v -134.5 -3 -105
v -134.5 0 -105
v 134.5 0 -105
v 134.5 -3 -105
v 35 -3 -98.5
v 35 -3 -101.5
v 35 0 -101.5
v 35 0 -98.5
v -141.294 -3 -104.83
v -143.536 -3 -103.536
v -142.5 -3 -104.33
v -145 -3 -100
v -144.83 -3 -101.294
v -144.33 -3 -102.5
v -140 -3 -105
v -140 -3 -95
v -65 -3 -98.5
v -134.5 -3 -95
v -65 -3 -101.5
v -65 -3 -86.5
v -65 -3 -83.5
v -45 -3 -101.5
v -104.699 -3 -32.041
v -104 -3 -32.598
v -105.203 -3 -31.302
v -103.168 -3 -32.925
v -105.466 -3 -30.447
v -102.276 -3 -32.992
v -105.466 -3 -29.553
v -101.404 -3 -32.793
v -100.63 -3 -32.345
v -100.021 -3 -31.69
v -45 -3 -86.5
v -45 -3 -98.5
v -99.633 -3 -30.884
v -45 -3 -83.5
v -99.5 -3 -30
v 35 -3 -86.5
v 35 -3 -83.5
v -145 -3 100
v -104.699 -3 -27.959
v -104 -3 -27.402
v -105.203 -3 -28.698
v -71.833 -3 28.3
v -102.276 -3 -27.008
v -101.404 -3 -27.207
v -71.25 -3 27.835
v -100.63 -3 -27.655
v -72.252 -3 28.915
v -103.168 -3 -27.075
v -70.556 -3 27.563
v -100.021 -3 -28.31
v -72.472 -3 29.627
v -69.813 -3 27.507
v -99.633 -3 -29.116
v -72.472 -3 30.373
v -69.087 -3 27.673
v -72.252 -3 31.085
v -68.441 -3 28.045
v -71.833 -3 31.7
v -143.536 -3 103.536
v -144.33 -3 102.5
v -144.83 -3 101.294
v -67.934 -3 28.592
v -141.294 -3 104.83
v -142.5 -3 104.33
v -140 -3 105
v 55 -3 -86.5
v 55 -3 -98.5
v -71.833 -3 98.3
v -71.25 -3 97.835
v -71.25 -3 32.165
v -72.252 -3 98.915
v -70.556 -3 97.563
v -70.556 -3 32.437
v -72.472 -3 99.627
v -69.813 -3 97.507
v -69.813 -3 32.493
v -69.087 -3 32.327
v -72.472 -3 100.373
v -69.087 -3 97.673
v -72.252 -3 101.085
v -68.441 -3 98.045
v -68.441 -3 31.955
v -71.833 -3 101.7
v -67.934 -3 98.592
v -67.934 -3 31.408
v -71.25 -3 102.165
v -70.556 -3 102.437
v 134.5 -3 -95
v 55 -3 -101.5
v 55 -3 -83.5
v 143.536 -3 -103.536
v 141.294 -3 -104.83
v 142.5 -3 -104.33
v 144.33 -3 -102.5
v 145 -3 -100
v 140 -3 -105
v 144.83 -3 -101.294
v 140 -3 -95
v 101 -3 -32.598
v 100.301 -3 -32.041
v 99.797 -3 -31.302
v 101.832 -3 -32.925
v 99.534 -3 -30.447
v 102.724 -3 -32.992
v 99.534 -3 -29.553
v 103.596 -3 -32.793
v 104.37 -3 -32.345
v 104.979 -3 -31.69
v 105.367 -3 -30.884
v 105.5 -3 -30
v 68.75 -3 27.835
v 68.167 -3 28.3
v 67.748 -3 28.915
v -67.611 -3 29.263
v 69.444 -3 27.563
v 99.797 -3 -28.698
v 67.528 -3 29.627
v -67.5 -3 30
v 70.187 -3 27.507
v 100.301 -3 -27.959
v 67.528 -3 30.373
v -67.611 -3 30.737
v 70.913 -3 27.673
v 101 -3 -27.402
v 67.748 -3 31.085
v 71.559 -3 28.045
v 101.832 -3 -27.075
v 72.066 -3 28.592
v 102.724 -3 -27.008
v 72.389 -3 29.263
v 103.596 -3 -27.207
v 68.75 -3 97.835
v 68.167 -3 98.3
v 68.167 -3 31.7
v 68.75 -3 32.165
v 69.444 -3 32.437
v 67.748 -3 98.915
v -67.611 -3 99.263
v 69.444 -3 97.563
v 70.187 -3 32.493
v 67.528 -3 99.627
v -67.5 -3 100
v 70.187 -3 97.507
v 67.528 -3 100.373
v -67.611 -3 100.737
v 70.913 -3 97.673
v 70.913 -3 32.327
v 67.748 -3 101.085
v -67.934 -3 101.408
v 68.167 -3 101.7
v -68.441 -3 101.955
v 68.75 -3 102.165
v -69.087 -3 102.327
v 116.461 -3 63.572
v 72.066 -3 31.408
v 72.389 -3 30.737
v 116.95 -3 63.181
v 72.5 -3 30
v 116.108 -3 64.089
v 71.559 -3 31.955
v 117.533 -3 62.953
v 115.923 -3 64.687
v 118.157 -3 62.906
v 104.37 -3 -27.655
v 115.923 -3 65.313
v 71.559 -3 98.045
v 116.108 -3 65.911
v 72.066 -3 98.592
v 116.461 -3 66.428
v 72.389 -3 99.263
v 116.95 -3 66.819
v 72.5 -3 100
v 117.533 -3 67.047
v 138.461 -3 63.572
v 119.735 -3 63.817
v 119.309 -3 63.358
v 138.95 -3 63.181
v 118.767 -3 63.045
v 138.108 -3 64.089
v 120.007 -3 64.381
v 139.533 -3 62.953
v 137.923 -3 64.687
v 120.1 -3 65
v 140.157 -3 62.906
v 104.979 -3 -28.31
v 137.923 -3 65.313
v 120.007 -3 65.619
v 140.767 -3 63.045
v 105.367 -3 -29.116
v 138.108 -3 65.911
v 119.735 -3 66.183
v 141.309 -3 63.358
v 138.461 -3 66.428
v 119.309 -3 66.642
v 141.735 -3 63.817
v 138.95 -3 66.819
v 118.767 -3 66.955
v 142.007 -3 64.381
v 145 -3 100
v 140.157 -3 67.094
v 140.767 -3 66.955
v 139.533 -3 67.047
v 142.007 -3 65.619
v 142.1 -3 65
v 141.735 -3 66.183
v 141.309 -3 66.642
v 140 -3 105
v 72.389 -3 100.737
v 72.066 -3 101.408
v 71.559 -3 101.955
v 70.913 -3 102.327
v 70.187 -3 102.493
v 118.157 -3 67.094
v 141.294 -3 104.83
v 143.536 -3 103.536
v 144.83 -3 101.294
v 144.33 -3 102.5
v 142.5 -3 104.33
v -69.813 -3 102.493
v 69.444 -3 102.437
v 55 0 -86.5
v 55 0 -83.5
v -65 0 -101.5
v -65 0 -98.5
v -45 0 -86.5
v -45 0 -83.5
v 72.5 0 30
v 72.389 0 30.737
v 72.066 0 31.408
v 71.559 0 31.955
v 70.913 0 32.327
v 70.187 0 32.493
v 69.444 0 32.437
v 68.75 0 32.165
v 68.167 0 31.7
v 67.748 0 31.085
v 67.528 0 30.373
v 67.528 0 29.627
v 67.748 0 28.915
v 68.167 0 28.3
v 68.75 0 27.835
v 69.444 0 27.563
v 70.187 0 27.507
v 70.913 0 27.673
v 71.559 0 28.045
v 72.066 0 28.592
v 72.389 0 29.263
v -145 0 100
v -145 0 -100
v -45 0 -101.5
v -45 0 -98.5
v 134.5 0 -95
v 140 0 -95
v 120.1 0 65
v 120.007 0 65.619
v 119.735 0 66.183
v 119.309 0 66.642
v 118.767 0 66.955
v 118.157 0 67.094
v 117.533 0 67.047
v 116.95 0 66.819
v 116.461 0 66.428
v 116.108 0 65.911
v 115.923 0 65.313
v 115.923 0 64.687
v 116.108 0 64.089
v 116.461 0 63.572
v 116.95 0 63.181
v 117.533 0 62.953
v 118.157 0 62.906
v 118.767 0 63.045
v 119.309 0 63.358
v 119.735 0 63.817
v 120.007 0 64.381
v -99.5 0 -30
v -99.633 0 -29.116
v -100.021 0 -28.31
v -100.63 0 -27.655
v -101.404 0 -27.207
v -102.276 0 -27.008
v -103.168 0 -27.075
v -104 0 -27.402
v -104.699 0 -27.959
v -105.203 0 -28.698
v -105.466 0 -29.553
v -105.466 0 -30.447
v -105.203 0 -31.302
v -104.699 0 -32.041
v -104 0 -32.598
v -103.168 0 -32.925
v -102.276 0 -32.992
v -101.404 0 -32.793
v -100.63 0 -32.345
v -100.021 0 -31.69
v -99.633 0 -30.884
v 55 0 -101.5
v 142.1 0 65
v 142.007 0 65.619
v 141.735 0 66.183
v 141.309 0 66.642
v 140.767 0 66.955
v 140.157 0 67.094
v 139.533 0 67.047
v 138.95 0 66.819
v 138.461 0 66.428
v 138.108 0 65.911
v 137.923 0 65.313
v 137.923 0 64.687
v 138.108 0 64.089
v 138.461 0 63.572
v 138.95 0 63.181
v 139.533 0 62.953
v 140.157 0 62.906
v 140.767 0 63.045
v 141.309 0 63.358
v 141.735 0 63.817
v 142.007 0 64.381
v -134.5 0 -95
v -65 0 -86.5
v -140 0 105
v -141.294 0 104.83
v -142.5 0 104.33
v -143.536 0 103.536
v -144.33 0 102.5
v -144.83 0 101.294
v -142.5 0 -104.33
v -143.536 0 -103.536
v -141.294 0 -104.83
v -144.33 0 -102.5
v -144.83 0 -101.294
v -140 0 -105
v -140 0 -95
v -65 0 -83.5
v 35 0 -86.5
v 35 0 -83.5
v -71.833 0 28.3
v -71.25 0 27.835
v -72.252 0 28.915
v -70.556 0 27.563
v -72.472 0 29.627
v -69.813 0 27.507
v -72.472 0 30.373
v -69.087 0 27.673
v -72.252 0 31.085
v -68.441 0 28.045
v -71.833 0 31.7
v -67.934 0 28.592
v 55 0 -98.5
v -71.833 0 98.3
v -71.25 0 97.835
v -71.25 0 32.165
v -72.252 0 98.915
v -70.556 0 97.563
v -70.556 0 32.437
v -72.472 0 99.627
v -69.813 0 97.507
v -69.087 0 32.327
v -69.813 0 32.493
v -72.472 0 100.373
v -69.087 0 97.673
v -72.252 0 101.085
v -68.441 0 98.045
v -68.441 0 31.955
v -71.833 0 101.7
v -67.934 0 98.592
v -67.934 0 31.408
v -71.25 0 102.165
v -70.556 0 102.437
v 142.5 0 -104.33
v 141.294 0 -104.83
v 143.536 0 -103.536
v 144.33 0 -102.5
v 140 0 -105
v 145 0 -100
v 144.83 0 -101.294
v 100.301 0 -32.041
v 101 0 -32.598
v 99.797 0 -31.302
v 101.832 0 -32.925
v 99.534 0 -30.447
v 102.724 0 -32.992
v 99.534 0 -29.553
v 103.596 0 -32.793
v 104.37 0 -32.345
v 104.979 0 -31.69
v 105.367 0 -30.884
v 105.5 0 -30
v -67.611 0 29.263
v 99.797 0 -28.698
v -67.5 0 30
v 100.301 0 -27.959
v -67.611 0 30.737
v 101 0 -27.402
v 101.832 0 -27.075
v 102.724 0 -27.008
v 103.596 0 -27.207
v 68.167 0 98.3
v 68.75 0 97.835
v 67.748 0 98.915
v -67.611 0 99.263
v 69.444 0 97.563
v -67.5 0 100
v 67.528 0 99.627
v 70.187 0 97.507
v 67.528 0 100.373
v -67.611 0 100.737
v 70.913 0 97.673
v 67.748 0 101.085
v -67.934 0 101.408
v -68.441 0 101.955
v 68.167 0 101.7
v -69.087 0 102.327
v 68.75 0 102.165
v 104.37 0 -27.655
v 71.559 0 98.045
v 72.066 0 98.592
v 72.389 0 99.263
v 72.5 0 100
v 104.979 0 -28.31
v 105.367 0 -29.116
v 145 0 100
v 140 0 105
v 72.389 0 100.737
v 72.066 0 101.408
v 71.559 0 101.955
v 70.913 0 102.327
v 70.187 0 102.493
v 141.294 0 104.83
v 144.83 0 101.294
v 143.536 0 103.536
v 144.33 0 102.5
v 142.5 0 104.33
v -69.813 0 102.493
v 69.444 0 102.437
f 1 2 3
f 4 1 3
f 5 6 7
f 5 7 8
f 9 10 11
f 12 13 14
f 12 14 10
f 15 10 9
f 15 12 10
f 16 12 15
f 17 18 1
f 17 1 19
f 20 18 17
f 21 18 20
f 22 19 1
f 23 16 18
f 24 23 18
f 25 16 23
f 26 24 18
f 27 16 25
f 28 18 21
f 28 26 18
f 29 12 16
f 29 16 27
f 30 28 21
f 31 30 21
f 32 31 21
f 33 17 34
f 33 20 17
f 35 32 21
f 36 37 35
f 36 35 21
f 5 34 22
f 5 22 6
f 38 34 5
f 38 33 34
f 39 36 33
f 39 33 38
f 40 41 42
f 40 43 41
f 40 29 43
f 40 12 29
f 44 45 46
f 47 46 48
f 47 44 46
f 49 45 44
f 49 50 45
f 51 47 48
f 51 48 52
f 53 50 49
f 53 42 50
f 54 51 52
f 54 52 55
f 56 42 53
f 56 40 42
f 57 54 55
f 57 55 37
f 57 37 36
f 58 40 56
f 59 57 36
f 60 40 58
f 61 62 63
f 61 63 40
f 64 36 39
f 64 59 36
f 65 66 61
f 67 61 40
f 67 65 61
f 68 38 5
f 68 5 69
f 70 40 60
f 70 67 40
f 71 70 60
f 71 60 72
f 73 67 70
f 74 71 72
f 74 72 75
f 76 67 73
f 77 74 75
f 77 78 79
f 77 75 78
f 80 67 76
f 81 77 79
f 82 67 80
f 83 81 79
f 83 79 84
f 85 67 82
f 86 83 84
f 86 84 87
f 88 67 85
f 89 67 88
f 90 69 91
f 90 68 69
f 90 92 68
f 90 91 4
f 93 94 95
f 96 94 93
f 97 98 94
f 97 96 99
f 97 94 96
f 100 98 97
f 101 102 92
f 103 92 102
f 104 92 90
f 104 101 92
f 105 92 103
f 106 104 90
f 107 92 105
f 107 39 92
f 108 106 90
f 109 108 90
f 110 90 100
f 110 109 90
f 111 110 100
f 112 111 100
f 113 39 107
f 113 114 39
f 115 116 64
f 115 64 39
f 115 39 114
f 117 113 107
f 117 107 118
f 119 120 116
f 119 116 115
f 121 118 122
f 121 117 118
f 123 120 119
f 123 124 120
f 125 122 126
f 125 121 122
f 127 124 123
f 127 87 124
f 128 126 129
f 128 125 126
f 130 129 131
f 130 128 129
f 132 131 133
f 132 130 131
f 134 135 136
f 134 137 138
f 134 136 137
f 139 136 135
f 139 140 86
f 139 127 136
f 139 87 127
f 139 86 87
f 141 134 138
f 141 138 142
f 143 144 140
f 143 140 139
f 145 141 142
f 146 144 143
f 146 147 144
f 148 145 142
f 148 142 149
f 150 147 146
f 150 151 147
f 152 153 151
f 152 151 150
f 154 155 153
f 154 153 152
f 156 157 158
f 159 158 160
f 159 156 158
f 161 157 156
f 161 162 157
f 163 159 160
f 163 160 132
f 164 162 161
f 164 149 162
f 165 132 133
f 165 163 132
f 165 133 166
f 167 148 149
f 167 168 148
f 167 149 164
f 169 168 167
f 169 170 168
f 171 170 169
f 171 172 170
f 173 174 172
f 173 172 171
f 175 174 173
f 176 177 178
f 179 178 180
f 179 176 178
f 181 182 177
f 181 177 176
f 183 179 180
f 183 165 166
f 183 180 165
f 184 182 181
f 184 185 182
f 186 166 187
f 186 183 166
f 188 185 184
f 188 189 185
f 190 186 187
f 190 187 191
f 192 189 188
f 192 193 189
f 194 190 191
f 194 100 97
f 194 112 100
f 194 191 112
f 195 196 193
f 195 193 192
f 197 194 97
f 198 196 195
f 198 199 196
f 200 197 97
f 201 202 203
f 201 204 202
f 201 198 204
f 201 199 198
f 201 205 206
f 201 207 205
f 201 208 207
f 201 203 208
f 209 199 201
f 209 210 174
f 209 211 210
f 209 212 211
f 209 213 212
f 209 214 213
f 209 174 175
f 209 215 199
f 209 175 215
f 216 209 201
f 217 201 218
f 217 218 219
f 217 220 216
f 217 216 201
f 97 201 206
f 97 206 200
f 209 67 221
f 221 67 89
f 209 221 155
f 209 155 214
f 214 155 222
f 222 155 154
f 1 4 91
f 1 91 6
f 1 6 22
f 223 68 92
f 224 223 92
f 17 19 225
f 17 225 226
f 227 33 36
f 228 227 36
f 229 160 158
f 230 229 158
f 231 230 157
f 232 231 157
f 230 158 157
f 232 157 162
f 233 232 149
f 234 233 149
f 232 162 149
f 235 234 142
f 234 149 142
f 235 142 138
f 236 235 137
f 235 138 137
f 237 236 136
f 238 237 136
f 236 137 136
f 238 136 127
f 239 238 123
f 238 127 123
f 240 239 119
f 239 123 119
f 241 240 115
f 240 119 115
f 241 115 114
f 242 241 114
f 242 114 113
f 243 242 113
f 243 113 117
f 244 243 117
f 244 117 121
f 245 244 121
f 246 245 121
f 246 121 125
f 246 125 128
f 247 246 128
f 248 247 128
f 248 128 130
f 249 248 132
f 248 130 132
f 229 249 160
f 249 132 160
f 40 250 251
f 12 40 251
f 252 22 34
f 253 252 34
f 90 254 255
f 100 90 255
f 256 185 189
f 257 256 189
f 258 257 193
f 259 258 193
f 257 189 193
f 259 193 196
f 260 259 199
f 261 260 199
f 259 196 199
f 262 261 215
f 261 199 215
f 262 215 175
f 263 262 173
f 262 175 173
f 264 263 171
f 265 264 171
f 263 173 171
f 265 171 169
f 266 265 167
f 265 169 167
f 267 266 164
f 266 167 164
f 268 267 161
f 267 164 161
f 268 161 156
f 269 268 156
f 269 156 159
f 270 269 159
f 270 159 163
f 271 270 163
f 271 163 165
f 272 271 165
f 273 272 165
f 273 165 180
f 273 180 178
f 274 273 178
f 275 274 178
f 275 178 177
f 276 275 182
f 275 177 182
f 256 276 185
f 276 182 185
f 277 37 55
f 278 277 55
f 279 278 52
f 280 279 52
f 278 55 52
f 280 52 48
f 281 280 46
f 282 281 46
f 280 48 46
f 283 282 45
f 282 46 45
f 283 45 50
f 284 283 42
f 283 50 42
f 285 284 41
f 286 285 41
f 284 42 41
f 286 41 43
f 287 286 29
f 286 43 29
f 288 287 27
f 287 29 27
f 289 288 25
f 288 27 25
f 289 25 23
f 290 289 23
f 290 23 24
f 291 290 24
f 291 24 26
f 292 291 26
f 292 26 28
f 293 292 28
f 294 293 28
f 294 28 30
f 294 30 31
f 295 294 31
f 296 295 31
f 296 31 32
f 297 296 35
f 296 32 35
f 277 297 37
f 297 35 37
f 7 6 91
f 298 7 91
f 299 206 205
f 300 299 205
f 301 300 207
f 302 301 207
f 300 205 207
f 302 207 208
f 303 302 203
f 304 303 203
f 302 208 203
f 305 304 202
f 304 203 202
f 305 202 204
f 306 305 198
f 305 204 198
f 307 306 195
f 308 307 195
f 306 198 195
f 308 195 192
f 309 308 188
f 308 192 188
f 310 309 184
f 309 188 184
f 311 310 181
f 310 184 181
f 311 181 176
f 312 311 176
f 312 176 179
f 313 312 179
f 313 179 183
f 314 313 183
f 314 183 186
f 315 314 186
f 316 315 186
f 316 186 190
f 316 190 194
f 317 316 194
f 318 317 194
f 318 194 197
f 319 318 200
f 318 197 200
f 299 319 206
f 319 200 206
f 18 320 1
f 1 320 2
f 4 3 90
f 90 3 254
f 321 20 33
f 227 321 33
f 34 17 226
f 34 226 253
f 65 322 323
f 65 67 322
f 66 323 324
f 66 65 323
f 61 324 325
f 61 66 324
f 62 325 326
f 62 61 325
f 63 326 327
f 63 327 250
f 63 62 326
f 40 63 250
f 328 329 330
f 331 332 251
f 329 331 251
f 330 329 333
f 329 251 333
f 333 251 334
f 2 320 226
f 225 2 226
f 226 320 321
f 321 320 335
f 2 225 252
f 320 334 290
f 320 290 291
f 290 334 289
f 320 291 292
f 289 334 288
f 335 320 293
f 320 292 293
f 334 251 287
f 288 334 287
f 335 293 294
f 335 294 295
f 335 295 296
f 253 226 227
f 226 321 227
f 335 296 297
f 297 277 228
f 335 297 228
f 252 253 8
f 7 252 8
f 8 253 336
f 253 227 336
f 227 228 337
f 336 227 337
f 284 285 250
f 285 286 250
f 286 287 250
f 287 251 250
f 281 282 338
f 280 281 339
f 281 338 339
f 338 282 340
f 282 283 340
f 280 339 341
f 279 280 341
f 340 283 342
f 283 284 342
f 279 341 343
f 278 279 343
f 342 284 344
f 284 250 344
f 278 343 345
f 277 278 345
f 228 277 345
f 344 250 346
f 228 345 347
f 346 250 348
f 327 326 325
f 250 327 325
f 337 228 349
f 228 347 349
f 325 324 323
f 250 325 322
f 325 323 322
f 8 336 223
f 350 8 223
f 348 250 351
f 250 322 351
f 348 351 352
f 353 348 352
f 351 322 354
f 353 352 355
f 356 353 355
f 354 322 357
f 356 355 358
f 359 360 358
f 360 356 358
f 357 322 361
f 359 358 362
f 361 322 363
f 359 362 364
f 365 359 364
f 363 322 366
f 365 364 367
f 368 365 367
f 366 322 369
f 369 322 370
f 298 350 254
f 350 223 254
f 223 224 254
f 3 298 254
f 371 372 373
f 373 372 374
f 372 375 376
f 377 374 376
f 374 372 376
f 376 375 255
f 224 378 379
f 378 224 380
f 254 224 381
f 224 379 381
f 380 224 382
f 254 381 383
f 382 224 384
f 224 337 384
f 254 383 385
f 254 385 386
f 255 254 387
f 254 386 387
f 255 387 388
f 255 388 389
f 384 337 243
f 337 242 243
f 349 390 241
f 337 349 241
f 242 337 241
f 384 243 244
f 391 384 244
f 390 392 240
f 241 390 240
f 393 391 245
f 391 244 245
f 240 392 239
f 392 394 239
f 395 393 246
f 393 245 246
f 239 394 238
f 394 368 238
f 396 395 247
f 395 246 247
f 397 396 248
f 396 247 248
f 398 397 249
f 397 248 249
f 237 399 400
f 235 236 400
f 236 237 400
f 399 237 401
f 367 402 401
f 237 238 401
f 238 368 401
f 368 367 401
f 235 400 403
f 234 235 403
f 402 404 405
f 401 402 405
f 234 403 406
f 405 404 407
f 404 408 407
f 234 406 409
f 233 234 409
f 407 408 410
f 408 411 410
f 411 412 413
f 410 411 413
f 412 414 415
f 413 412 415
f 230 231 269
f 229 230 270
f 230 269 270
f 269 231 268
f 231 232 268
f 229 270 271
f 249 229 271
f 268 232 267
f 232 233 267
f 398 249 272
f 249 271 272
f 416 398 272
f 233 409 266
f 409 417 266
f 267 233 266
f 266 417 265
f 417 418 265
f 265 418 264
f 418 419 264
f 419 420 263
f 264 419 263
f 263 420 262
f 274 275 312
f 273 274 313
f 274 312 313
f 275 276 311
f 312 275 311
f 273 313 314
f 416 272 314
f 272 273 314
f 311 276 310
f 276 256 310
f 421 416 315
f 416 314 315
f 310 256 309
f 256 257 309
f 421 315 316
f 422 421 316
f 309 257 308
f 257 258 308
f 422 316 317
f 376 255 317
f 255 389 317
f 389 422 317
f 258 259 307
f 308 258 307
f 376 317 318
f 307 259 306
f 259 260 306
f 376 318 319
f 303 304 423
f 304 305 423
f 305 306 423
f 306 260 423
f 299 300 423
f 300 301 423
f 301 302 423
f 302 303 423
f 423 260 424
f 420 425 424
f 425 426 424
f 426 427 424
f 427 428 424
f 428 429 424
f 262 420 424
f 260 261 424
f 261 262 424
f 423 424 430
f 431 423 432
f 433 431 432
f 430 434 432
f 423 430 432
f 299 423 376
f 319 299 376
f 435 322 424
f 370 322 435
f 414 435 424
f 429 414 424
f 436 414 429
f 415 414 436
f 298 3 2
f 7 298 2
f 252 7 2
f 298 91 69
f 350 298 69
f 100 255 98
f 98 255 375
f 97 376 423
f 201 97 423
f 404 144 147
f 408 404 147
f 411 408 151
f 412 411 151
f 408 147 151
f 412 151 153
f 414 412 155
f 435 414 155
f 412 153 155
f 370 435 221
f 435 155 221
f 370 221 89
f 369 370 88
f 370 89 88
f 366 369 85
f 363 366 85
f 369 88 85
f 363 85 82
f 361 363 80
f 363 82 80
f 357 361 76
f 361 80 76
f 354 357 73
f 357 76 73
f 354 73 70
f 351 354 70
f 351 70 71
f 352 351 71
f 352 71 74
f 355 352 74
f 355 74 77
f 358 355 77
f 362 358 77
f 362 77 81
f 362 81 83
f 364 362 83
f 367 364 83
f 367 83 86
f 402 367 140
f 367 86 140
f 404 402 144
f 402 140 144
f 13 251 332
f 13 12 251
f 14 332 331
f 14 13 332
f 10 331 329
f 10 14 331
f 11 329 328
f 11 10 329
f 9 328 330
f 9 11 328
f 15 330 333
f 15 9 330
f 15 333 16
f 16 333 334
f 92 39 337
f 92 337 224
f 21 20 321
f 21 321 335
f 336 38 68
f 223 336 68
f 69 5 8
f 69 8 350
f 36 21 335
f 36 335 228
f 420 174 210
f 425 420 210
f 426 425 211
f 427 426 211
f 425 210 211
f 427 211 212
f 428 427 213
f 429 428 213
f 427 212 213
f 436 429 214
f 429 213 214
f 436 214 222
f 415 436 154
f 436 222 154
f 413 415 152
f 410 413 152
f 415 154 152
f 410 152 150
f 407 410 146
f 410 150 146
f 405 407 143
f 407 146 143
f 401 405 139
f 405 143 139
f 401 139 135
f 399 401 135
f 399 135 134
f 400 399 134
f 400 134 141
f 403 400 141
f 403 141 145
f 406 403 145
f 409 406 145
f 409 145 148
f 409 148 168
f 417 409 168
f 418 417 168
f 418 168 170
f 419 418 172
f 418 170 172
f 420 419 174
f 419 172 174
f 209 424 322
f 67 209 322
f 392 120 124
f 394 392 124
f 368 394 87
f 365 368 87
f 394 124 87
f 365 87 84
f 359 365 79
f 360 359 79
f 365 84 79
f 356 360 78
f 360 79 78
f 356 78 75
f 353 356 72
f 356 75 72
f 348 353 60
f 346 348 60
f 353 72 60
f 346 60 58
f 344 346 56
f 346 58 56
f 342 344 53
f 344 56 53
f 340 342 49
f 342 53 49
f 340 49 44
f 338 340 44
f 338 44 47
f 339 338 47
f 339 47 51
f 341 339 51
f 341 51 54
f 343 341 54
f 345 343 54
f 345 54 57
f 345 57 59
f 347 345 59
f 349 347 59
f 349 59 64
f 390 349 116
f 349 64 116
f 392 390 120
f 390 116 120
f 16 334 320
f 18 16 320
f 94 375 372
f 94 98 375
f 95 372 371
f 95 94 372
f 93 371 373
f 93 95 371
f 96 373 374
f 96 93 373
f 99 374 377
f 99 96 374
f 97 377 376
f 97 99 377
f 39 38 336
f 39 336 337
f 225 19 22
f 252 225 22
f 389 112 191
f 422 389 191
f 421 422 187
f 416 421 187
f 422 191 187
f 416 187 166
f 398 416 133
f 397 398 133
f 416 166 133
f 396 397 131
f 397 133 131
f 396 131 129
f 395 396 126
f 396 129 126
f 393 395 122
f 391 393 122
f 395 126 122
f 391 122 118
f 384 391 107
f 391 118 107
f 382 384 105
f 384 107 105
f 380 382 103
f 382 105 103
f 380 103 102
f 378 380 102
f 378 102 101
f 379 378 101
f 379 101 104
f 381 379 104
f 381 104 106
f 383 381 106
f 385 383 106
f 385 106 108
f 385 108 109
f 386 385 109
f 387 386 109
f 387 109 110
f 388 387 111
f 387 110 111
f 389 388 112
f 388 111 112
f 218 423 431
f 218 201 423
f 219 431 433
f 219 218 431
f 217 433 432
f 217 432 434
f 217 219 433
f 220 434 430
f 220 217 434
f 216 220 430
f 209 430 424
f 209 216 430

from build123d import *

# Parameters (mm, degrees)
F1_DEPTH = 3
F2_R     = 2.5
F3_DEPTH = 3
F4_R     = 3
F5_DEPTH = 3
F6_R     = 2.1
F7_DEPTH = 3
F8_W     = 20
F8_H     = 3
F9_DEPTH = 3
F10_R    = 4.99999


# Not quite as in the source:
# - a fillet or chamfer is up to 0.001 mm smaller than in the source, because OpenCascade refuses the exact size


with BuildPart() as f1:
    # F0 (on Front) → F1 (new body)
    with BuildSketch(Plane.XZ):
        Polygon((140, -105), (145, -105), (145, 105), (-145, 105), (-145, -105), (-140, -105), (-140, -95), (-134.5, -95), (-134.5, -105), (134.5, -105), (134.5, -95), (140, -95), align=None)
    extrude(amount=F1_DEPTH)

    # F2 (on face) → F3 (cut, through all)
    with BuildSketch(Plane.XZ.offset(3)):
        with Locations((-70, 100)):
            Circle(F2_R)
        with Locations((-70, 30)):
            Circle(F2_R)
        with Locations((70, 100)):
            Circle(F2_R)
        with Locations((70, 30)):
            Circle(F2_R)
    extrude(amount=-F3_DEPTH, mode=Mode.SUBTRACT)

    # F4 (on face) → F5 (cut, through all)
    with BuildSketch(Plane.XZ.offset(3)):
        with Locations((102.5, -30)):
            Circle(F4_R)
        with Locations((-102.5, -30)):
            Circle(F4_R)
    extrude(amount=-F5_DEPTH, mode=Mode.SUBTRACT)

    # F6 (on face) → F7 (cut, through all)
    with BuildSketch(Plane.XZ.offset(3)):
        with Locations((118, 65)):
            Circle(F6_R)
        with Locations((140, 65)):
            Circle(F6_R)
    extrude(amount=-F7_DEPTH, mode=Mode.SUBTRACT)

    # F8 (on face) → F9 (cut, through all)
    with BuildSketch(Plane.XZ.offset(3)):
        with Locations((-55, -85)):
            Rectangle(F8_W, F8_H)
        with Locations((45, -85)):
            Rectangle(F8_W, F8_H)
        with Locations((45, -100)):
            Rectangle(F8_W, F8_H)
        with Locations((-55, -100)):
            Rectangle(F8_W, F8_H)
    extrude(amount=-F9_DEPTH, mode=Mode.SUBTRACT)

    # F10 (radius 5 in the source; OpenCascade refuses exactly that, so slightly less here)
    f10_edges = [f1.edges().sort_by_distance(p)[0] for p in [
        (-145, -1.5, 105),
        (-145, -1.5, -105),
        (145, -1.5, -105),
        (145, -1.5, 105),
    ]]
    fillet(f10_edges, radius=F10_R)


solid = f1.part
